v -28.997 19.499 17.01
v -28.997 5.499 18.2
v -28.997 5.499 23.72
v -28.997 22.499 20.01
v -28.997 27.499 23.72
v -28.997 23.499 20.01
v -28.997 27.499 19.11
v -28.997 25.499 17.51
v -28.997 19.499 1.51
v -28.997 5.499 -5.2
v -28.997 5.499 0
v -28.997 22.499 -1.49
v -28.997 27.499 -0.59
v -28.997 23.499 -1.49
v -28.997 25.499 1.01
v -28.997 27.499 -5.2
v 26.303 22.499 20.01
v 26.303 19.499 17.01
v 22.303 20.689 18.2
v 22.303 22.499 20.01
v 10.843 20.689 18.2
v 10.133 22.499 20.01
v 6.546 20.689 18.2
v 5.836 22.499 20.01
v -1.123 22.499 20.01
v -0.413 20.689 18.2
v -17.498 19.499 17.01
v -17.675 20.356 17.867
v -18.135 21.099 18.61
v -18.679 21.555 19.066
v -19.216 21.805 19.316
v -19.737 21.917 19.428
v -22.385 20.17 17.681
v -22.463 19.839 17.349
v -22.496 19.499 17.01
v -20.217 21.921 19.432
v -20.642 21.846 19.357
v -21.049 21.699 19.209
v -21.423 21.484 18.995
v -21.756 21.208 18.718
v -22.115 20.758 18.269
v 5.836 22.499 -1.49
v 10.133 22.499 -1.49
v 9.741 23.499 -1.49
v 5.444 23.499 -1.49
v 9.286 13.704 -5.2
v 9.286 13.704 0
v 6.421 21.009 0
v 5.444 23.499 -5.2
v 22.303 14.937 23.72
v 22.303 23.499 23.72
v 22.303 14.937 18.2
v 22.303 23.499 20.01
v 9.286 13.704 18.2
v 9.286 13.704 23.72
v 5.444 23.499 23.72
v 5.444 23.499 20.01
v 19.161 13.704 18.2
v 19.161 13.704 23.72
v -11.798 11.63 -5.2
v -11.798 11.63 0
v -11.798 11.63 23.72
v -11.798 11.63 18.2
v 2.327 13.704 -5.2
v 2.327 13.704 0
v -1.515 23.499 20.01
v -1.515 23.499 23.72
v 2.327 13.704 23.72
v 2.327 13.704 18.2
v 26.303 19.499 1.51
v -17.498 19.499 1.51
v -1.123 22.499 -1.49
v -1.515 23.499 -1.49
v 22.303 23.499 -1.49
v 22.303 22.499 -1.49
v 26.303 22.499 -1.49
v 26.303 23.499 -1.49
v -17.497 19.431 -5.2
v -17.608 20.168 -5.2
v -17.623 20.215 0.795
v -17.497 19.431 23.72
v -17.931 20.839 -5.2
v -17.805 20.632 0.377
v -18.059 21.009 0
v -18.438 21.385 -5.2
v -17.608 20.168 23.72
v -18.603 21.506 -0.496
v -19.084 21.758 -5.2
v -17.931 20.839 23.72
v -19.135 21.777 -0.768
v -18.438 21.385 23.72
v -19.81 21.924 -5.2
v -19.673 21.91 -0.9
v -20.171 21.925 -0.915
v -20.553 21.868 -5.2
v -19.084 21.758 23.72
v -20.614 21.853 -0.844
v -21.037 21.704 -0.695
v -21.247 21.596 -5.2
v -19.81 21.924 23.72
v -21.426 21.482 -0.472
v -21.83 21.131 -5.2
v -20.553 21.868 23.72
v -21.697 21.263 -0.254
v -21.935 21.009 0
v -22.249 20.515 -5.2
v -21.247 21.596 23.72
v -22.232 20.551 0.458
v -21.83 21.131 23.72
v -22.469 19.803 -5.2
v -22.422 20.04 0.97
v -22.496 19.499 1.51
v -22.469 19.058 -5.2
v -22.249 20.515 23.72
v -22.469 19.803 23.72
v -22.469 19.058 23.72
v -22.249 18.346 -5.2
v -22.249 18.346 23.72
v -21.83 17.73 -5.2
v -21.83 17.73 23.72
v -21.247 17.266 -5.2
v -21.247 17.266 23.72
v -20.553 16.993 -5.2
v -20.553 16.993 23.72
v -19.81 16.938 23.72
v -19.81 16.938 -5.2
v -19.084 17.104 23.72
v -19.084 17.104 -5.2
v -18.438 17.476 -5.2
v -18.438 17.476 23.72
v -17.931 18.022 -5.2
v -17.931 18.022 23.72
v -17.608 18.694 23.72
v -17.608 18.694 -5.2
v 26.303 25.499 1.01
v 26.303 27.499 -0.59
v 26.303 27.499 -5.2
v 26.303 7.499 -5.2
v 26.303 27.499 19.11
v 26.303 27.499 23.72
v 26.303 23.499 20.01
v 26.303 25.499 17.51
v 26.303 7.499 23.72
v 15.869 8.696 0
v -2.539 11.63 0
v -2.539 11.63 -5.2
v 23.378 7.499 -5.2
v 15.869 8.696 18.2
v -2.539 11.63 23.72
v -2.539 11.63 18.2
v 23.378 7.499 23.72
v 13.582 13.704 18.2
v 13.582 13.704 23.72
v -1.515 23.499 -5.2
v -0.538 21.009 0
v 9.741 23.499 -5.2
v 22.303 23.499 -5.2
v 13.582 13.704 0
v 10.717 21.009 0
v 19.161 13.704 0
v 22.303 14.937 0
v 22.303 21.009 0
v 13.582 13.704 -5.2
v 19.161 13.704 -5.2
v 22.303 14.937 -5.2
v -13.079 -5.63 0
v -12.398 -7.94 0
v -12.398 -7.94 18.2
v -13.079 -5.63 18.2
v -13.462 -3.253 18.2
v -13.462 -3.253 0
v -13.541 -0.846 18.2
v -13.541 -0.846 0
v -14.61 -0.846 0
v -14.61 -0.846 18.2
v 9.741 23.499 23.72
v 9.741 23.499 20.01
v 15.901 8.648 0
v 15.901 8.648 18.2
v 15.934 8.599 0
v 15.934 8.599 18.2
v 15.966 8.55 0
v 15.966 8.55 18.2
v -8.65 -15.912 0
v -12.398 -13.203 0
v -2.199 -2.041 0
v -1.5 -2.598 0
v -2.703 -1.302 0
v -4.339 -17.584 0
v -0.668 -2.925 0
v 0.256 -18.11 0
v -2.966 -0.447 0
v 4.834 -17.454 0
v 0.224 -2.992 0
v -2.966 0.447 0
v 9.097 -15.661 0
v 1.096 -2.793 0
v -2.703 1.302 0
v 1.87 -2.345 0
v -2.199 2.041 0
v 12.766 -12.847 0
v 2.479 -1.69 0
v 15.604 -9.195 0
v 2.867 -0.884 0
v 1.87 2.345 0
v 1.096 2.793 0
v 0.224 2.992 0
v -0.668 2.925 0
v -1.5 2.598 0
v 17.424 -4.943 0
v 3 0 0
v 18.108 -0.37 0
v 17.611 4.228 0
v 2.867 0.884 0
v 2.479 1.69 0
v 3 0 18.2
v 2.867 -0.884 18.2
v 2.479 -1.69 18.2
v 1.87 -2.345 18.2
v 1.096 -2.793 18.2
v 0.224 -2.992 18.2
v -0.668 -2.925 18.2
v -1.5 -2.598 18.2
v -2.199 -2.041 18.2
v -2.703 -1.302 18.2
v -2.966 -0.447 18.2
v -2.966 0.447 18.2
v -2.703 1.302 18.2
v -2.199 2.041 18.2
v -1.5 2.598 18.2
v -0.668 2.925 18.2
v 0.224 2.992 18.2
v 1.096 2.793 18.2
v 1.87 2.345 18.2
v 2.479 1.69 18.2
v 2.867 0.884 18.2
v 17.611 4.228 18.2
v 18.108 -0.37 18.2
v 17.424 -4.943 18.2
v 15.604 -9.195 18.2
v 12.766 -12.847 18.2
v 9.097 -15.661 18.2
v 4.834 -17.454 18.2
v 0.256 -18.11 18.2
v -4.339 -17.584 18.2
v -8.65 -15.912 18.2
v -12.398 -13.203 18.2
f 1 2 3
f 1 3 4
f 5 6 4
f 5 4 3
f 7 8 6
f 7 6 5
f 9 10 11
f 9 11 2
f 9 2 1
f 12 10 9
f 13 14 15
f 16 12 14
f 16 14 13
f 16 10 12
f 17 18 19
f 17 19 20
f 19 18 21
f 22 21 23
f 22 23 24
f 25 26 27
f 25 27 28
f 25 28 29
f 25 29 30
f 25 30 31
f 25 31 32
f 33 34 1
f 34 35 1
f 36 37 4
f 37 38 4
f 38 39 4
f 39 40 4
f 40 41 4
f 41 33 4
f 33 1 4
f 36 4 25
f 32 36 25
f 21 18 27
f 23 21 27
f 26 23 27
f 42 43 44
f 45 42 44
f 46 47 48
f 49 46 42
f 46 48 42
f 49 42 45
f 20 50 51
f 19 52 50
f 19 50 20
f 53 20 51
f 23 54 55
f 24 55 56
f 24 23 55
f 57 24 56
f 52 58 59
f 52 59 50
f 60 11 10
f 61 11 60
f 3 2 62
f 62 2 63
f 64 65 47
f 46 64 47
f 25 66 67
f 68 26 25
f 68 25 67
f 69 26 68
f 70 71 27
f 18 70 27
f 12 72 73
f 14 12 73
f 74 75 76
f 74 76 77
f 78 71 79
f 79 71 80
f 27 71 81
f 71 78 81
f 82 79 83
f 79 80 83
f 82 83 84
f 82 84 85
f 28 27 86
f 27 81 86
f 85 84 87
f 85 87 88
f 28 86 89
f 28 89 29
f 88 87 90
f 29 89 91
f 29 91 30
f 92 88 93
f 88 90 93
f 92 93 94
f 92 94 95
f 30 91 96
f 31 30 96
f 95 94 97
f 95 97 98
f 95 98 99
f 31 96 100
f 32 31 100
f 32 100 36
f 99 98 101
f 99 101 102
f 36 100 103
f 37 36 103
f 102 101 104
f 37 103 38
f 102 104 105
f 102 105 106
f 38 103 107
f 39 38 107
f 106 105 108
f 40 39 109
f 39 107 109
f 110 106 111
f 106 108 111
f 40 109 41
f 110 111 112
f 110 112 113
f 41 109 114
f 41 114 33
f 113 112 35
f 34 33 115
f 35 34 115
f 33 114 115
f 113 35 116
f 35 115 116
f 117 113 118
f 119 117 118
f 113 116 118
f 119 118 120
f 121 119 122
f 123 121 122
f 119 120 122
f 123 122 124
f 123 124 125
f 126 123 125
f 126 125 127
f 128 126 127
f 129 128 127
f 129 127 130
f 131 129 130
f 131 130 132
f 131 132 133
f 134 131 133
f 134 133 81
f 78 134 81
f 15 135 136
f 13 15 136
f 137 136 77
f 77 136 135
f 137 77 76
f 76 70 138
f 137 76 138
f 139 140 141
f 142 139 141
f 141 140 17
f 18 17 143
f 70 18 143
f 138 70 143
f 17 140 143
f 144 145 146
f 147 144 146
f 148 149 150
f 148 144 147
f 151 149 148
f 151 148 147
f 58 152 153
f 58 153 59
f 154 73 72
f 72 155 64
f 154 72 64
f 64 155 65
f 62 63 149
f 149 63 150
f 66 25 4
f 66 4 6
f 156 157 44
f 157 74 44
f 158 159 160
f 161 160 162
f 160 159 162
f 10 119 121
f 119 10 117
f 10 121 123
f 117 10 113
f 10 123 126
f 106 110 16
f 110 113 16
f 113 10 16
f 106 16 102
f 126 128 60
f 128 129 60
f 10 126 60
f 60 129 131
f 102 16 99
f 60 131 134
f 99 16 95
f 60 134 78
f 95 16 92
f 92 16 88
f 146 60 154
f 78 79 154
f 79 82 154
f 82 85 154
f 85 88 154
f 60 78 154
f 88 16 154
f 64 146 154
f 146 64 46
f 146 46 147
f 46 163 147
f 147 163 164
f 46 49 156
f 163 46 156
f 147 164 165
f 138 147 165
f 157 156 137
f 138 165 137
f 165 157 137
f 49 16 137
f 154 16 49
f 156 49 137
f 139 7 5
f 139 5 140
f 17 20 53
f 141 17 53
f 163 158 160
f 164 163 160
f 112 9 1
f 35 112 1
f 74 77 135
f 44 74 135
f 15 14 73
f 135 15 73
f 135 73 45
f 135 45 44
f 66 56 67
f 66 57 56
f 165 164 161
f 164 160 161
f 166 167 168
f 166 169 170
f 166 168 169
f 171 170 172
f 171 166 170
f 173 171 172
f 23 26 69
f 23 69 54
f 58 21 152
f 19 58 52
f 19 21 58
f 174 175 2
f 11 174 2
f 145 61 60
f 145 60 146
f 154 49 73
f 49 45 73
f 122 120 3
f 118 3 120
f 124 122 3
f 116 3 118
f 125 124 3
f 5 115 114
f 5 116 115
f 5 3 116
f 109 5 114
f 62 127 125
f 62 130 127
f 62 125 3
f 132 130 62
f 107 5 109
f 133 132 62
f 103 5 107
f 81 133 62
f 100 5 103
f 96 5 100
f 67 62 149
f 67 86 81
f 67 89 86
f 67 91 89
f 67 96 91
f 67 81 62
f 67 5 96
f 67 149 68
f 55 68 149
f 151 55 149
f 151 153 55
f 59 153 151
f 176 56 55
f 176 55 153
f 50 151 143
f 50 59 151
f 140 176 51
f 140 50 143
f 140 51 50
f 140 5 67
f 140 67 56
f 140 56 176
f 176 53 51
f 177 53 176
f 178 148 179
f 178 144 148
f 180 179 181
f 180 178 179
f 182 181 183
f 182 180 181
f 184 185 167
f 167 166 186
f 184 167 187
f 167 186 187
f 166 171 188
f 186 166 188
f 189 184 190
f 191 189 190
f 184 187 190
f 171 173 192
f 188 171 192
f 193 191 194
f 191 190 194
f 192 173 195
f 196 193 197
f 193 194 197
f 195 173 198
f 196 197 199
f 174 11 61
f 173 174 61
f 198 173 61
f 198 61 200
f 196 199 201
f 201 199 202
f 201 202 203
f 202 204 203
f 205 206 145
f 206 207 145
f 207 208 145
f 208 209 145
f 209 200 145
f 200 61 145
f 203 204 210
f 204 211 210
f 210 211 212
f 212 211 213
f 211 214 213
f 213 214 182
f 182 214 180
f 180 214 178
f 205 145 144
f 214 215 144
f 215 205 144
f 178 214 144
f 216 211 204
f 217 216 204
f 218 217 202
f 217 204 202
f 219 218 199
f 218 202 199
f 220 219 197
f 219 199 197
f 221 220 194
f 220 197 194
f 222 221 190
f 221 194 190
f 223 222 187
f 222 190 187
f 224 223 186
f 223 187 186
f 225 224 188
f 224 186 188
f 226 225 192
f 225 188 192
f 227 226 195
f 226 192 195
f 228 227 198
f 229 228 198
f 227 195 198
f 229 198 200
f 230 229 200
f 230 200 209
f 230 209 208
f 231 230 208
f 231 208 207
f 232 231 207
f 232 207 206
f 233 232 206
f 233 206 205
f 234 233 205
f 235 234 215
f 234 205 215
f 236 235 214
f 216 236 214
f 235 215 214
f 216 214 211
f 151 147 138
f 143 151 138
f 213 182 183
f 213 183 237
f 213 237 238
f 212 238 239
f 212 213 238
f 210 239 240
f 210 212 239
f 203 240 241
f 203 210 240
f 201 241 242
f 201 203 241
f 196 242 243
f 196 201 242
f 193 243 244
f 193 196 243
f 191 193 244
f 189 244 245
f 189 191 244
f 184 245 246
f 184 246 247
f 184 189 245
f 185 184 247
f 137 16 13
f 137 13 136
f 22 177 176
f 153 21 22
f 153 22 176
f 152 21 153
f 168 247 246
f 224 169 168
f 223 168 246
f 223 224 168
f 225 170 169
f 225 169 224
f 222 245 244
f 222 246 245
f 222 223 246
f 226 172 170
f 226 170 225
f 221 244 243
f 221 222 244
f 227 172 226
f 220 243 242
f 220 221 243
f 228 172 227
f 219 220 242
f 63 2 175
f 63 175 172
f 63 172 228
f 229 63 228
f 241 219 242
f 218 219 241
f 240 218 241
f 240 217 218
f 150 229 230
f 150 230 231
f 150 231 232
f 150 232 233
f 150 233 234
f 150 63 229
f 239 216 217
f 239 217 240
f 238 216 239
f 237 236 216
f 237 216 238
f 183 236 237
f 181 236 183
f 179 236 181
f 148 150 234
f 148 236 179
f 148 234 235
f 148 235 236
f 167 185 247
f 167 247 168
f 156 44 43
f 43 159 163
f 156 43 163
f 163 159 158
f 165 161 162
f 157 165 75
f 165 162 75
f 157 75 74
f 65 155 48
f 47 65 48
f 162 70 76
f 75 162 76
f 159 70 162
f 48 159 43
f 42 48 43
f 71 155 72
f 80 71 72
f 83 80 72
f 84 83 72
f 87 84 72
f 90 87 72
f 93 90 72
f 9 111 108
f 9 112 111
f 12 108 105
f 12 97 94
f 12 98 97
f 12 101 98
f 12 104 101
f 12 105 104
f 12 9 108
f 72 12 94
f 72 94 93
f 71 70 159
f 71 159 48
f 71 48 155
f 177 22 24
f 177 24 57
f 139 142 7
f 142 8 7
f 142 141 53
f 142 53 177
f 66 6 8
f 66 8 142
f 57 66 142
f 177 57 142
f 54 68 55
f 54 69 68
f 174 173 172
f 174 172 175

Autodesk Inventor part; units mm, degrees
ref_plane "YZ Plane" through (0, 0, 0) normal (1, 0, 0) x (0, 1, 0)
ref_plane "XZ Plane" through (0, 0, 0) normal (0, 1, 0) x (-1, 0, 0)
ref_plane "XY Plane" through (0, 0, 0) normal (0, 0, 1) x (1, 0, 0)
sketch "Base" plane through (0, 0, 0) normal (0, 0, 1) x (1, 0, 0)
  line L0 (-12.3981, -13.2027) -> (-12.3981, -7.9395)
  arc A0 (-12.3981, -13.2027) -> (15.9662, 8.5503) centre (0, 0) ccw
  arc A1 (15.9662, 8.5503) -> (5.3507, 16.1838) centre (0.6063, -1.6117) ccw
  arc A2 (5.3507, 16.1838) -> (-4.7343, 14.6301) centre (2.0791, 3.9125) ccw
  arc A3 (-4.7343, 14.6301) -> (-12.3981, -7.9395) centre (5.4695, -1.4207) ccw
  circle A4 centre (0, 0) radius 3
  circle A5 centre (0, 0) radius 3
  circle A6 centre (0, 0) radius 13.497 construction
  line L1 (-28.997, 27.4994) -> (26.303, 27.4994)
  line L2 (4.8764, -0.8461) -> (-14.6101, -0.8461)
  line L3 (-14.6101, -0.8461) -> (-28.997, 5.4994)
  line L4 (-28.997, 5.4994) -> (-28.997, 27.4994)
  line L5 (-28.997, 5.4994) -> (-11.7979, 11.6298)
  line L6 (-11.7979, 11.6298) -> (-2.5387, 11.6298)
  line L7 (-2.5387, 11.6298) -> (23.3778, 7.4994)
  line L8 (23.3778, 7.4994) -> (26.303, 7.4994)
  line L9 (26.303, 27.4994) -> (26.303, 7.4994)
  line L10 (4.8764, -0.8461) -> (26.303, 7.4994)
  line L11 (22.303, 23.4994) -> (9.7408, 23.4994)
  line L12 (9.7408, 23.4994) -> (13.5825, 13.7045)
  line L13 (13.5825, 13.7045) -> (19.1614, 13.7045)
  line L14 (19.1614, 13.7045) -> (22.303, 14.9367)
  line L15 (22.303, 14.9367) -> (22.303, 23.4994)
  line L16 (5.4441, 23.4994) -> (-1.5148, 23.4994)
  line L17 (-1.5148, 23.4994) -> (2.3269, 13.7045)
  line L18 (2.3269, 13.7045) -> (9.2858, 13.7045)
  line L19 (9.2858, 13.7045) -> (5.4441, 23.4994)
  circle A7 centre (-19.997, 19.4307) radius 2.5
  arc A8 (-4.7343, 14.6301) -> (-12.3981, -7.9395) centre (5.4695, -1.4207) ccw
  line L20 (-13.497, 0) -> (-13.497, -16.2978) construction
  point P0 (11.7017, -28.7626)
  point P1 (-13.5415, -0.8461)
  point P2 (15.8686, 8.6961)
  point P3 (-2.8782, -0.8461)
  point P4 (2.8782, -0.8461)
  point P5 (17.6358, 4.1236)
  dimension "d0" = 22
  dimension "d1" = 20
  dimension "d2" = 5
  dimension "d3" = 9
  dimension "d4" = 4
  dimension "d5" = 4
  dimension "d6" = 4
  dimension "d7" = 55.3
  dimension "d8" = 15.5
extrude "BaseFeature" add sketch "Base" along normal blind 18.2 contours L0 A3 L2 A4 L10 A0 | L10 L2 A4 A3 L6 L7 A1 A0 | L2 L3 L5 L6 A3 | L8 L7 A1 L19 L16 L17 A2 A3 L6 L5 L4 L1 L9 | A3 A2 L17 L18 L19 A1 L7 L6 | L19 L18 L17 A2 A1 | A1 A2 L17 L16 L19 | L15 L14 L13 L12 L11
extrude "ExtendFeature" add sketch "Base" along normal blind 23.72 contours L8 L7 A1 L19 L16 L17 A2 A3 L6 L5 L4 L1 L9 | A3 A2 L17 L18 L19 A1 L7 L6
extrude "Extend2Feature" add sketch "Base" against normal blind 5.2 contours L8 L7 A1 L19 L16 L17 A2 A3 L6 L5 L4 L1 L9 | A3 A2 L17 L18 L19 A1 L7 L6
sketch "PicatinnyRail" plane through (-28.997, 5.4994, 23.72) normal (-1, 0, 0) x (0, 0, 1)
  line L0 (-23.72, 0) -> (-5.52, 0) projected
  line L1 (-5.52, 0) -> (0, 0) projected
  line L2 (0, 22) -> (0, 0) projected
  line L3 (-28.92, 22) -> (0, 22) construction
  line L4 (-28.92, 0) -> (-28.92, 22) projected
  line L5 (-23.72, 0) -> (-28.92, 0) projected
  line L6 (-22.21, 14) -> (-6.71, 14)
  line L7 (-14.46, 14) -> (-14.46, 22) construction
  line L8 (-28.92, 22) -> (0, 22) construction
  line L9 (-28.92, 22) -> (0, 22) construction
  line L10 (-6.71, 14) -> (-3.71, 14) construction
  line L11 (0, 18) -> (0, 8.2052) projected
  line L12 (-22.21, 14) -> (-25.21, 14) construction
  line L13 (-3.71, 14) -> (-3.71, 17) construction
  line L14 (-25.21, 14) -> (-25.21, 17) construction
  line L15 (-23.72, 18) -> (-28.92, 18) projected
  line L16 (-6.71, 14) -> (-3.71, 17)
  line L17 (-22.21, 14) -> (-25.21, 17)
  line L18 (-3.71, 17) -> (-25.21, 17) construction
  line L19 (-3.71, 17) -> (-3.71, 18)
  line L20 (-25.21, 17) -> (-25.21, 18)
  line L21 (-3.71, 18) -> (-6.21, 20)
  line L22 (-3.71, 18) -> (-3.71, 20) construction
  line L23 (-3.71, 20) -> (-6.21, 20) construction
  line L24 (-6.21, 20) -> (-4.61, 22)
  line L25 (-25.21, 18) -> (-22.71, 20)
  line L26 (-22.71, 20) -> (-24.31, 22)
  line L27 (-24.31, 22) -> (-4.61, 22)
  point P0 (-23.72, -5.4994)
  dimension "d15" = 15.5
  dimension "d16" = 3
  dimension "d17" = 3
  dimension "d18" = 3
  dimension "d19" = 1
  dimension "d20" = 2
  dimension "d21" = 2.5
  dimension "d22" = 2
  dimension "d23" = 38.66
  dimension "d24" = 38.66
extrude "PicatinnyRailCut" cut sketch "PicatinnyRail" against normal through all
ref_plane "MidPlane" through (0, 0, 9.26) normal (0, 0, 1) x (1, 0, 0)
equation "\"d24\" = d23"
properties part number "SideHandleBase"
